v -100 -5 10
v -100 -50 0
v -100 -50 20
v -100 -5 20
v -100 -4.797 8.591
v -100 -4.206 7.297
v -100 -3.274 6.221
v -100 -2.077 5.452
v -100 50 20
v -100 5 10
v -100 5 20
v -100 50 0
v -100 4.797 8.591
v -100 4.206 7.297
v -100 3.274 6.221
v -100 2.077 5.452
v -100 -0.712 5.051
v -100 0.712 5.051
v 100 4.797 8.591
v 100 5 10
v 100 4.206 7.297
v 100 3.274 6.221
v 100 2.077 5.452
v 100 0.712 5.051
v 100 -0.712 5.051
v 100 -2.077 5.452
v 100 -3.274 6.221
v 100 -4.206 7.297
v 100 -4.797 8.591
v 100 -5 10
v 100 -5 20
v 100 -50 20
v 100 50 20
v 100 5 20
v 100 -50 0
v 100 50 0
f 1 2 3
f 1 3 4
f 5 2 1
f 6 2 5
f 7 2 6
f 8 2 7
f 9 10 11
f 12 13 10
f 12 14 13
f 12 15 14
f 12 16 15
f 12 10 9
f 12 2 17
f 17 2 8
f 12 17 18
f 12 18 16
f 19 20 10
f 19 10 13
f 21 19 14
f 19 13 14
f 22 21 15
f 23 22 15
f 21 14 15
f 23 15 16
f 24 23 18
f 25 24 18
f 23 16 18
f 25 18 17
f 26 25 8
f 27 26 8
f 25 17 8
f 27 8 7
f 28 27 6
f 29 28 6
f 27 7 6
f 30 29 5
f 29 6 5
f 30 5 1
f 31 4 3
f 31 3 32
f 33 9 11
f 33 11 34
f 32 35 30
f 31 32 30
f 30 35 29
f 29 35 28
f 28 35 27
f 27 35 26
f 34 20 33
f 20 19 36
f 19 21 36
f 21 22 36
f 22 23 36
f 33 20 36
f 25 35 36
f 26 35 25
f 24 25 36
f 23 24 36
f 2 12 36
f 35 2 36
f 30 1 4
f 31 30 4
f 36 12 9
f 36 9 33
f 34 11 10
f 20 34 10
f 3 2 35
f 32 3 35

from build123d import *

# Parameters (mm, degrees)
SKETCH_1_W          = 200
SKETCH_1_H          = 100
EXTRUDE_1_DEPTH     = 20
CUT_EXTRUDE_1_DEPTH = 201


with BuildPart() as part:
    # 草图1 → 凸台-拉伸1 (new body)
    with BuildSketch(Plane.XY):
        Rectangle(SKETCH_1_W, SKETCH_1_H)
    extrude(amount=EXTRUDE_1_DEPTH)

    # 草图2 → 切除-拉伸1 (cut, through all)
    with BuildSketch(Plane.ZY.offset(100)):
        with BuildLine():
            Line((10, -5), (20, -5))
            Line((20, -5), (20, 5))
            Line((20, 5), (10, 5))
            ThreePointArc((10, 5), (5, 0), (10, -5))
        make_face()
    extrude(amount=-CUT_EXTRUDE_1_DEPTH, mode=Mode.SUBTRACT)


solid = part.part
